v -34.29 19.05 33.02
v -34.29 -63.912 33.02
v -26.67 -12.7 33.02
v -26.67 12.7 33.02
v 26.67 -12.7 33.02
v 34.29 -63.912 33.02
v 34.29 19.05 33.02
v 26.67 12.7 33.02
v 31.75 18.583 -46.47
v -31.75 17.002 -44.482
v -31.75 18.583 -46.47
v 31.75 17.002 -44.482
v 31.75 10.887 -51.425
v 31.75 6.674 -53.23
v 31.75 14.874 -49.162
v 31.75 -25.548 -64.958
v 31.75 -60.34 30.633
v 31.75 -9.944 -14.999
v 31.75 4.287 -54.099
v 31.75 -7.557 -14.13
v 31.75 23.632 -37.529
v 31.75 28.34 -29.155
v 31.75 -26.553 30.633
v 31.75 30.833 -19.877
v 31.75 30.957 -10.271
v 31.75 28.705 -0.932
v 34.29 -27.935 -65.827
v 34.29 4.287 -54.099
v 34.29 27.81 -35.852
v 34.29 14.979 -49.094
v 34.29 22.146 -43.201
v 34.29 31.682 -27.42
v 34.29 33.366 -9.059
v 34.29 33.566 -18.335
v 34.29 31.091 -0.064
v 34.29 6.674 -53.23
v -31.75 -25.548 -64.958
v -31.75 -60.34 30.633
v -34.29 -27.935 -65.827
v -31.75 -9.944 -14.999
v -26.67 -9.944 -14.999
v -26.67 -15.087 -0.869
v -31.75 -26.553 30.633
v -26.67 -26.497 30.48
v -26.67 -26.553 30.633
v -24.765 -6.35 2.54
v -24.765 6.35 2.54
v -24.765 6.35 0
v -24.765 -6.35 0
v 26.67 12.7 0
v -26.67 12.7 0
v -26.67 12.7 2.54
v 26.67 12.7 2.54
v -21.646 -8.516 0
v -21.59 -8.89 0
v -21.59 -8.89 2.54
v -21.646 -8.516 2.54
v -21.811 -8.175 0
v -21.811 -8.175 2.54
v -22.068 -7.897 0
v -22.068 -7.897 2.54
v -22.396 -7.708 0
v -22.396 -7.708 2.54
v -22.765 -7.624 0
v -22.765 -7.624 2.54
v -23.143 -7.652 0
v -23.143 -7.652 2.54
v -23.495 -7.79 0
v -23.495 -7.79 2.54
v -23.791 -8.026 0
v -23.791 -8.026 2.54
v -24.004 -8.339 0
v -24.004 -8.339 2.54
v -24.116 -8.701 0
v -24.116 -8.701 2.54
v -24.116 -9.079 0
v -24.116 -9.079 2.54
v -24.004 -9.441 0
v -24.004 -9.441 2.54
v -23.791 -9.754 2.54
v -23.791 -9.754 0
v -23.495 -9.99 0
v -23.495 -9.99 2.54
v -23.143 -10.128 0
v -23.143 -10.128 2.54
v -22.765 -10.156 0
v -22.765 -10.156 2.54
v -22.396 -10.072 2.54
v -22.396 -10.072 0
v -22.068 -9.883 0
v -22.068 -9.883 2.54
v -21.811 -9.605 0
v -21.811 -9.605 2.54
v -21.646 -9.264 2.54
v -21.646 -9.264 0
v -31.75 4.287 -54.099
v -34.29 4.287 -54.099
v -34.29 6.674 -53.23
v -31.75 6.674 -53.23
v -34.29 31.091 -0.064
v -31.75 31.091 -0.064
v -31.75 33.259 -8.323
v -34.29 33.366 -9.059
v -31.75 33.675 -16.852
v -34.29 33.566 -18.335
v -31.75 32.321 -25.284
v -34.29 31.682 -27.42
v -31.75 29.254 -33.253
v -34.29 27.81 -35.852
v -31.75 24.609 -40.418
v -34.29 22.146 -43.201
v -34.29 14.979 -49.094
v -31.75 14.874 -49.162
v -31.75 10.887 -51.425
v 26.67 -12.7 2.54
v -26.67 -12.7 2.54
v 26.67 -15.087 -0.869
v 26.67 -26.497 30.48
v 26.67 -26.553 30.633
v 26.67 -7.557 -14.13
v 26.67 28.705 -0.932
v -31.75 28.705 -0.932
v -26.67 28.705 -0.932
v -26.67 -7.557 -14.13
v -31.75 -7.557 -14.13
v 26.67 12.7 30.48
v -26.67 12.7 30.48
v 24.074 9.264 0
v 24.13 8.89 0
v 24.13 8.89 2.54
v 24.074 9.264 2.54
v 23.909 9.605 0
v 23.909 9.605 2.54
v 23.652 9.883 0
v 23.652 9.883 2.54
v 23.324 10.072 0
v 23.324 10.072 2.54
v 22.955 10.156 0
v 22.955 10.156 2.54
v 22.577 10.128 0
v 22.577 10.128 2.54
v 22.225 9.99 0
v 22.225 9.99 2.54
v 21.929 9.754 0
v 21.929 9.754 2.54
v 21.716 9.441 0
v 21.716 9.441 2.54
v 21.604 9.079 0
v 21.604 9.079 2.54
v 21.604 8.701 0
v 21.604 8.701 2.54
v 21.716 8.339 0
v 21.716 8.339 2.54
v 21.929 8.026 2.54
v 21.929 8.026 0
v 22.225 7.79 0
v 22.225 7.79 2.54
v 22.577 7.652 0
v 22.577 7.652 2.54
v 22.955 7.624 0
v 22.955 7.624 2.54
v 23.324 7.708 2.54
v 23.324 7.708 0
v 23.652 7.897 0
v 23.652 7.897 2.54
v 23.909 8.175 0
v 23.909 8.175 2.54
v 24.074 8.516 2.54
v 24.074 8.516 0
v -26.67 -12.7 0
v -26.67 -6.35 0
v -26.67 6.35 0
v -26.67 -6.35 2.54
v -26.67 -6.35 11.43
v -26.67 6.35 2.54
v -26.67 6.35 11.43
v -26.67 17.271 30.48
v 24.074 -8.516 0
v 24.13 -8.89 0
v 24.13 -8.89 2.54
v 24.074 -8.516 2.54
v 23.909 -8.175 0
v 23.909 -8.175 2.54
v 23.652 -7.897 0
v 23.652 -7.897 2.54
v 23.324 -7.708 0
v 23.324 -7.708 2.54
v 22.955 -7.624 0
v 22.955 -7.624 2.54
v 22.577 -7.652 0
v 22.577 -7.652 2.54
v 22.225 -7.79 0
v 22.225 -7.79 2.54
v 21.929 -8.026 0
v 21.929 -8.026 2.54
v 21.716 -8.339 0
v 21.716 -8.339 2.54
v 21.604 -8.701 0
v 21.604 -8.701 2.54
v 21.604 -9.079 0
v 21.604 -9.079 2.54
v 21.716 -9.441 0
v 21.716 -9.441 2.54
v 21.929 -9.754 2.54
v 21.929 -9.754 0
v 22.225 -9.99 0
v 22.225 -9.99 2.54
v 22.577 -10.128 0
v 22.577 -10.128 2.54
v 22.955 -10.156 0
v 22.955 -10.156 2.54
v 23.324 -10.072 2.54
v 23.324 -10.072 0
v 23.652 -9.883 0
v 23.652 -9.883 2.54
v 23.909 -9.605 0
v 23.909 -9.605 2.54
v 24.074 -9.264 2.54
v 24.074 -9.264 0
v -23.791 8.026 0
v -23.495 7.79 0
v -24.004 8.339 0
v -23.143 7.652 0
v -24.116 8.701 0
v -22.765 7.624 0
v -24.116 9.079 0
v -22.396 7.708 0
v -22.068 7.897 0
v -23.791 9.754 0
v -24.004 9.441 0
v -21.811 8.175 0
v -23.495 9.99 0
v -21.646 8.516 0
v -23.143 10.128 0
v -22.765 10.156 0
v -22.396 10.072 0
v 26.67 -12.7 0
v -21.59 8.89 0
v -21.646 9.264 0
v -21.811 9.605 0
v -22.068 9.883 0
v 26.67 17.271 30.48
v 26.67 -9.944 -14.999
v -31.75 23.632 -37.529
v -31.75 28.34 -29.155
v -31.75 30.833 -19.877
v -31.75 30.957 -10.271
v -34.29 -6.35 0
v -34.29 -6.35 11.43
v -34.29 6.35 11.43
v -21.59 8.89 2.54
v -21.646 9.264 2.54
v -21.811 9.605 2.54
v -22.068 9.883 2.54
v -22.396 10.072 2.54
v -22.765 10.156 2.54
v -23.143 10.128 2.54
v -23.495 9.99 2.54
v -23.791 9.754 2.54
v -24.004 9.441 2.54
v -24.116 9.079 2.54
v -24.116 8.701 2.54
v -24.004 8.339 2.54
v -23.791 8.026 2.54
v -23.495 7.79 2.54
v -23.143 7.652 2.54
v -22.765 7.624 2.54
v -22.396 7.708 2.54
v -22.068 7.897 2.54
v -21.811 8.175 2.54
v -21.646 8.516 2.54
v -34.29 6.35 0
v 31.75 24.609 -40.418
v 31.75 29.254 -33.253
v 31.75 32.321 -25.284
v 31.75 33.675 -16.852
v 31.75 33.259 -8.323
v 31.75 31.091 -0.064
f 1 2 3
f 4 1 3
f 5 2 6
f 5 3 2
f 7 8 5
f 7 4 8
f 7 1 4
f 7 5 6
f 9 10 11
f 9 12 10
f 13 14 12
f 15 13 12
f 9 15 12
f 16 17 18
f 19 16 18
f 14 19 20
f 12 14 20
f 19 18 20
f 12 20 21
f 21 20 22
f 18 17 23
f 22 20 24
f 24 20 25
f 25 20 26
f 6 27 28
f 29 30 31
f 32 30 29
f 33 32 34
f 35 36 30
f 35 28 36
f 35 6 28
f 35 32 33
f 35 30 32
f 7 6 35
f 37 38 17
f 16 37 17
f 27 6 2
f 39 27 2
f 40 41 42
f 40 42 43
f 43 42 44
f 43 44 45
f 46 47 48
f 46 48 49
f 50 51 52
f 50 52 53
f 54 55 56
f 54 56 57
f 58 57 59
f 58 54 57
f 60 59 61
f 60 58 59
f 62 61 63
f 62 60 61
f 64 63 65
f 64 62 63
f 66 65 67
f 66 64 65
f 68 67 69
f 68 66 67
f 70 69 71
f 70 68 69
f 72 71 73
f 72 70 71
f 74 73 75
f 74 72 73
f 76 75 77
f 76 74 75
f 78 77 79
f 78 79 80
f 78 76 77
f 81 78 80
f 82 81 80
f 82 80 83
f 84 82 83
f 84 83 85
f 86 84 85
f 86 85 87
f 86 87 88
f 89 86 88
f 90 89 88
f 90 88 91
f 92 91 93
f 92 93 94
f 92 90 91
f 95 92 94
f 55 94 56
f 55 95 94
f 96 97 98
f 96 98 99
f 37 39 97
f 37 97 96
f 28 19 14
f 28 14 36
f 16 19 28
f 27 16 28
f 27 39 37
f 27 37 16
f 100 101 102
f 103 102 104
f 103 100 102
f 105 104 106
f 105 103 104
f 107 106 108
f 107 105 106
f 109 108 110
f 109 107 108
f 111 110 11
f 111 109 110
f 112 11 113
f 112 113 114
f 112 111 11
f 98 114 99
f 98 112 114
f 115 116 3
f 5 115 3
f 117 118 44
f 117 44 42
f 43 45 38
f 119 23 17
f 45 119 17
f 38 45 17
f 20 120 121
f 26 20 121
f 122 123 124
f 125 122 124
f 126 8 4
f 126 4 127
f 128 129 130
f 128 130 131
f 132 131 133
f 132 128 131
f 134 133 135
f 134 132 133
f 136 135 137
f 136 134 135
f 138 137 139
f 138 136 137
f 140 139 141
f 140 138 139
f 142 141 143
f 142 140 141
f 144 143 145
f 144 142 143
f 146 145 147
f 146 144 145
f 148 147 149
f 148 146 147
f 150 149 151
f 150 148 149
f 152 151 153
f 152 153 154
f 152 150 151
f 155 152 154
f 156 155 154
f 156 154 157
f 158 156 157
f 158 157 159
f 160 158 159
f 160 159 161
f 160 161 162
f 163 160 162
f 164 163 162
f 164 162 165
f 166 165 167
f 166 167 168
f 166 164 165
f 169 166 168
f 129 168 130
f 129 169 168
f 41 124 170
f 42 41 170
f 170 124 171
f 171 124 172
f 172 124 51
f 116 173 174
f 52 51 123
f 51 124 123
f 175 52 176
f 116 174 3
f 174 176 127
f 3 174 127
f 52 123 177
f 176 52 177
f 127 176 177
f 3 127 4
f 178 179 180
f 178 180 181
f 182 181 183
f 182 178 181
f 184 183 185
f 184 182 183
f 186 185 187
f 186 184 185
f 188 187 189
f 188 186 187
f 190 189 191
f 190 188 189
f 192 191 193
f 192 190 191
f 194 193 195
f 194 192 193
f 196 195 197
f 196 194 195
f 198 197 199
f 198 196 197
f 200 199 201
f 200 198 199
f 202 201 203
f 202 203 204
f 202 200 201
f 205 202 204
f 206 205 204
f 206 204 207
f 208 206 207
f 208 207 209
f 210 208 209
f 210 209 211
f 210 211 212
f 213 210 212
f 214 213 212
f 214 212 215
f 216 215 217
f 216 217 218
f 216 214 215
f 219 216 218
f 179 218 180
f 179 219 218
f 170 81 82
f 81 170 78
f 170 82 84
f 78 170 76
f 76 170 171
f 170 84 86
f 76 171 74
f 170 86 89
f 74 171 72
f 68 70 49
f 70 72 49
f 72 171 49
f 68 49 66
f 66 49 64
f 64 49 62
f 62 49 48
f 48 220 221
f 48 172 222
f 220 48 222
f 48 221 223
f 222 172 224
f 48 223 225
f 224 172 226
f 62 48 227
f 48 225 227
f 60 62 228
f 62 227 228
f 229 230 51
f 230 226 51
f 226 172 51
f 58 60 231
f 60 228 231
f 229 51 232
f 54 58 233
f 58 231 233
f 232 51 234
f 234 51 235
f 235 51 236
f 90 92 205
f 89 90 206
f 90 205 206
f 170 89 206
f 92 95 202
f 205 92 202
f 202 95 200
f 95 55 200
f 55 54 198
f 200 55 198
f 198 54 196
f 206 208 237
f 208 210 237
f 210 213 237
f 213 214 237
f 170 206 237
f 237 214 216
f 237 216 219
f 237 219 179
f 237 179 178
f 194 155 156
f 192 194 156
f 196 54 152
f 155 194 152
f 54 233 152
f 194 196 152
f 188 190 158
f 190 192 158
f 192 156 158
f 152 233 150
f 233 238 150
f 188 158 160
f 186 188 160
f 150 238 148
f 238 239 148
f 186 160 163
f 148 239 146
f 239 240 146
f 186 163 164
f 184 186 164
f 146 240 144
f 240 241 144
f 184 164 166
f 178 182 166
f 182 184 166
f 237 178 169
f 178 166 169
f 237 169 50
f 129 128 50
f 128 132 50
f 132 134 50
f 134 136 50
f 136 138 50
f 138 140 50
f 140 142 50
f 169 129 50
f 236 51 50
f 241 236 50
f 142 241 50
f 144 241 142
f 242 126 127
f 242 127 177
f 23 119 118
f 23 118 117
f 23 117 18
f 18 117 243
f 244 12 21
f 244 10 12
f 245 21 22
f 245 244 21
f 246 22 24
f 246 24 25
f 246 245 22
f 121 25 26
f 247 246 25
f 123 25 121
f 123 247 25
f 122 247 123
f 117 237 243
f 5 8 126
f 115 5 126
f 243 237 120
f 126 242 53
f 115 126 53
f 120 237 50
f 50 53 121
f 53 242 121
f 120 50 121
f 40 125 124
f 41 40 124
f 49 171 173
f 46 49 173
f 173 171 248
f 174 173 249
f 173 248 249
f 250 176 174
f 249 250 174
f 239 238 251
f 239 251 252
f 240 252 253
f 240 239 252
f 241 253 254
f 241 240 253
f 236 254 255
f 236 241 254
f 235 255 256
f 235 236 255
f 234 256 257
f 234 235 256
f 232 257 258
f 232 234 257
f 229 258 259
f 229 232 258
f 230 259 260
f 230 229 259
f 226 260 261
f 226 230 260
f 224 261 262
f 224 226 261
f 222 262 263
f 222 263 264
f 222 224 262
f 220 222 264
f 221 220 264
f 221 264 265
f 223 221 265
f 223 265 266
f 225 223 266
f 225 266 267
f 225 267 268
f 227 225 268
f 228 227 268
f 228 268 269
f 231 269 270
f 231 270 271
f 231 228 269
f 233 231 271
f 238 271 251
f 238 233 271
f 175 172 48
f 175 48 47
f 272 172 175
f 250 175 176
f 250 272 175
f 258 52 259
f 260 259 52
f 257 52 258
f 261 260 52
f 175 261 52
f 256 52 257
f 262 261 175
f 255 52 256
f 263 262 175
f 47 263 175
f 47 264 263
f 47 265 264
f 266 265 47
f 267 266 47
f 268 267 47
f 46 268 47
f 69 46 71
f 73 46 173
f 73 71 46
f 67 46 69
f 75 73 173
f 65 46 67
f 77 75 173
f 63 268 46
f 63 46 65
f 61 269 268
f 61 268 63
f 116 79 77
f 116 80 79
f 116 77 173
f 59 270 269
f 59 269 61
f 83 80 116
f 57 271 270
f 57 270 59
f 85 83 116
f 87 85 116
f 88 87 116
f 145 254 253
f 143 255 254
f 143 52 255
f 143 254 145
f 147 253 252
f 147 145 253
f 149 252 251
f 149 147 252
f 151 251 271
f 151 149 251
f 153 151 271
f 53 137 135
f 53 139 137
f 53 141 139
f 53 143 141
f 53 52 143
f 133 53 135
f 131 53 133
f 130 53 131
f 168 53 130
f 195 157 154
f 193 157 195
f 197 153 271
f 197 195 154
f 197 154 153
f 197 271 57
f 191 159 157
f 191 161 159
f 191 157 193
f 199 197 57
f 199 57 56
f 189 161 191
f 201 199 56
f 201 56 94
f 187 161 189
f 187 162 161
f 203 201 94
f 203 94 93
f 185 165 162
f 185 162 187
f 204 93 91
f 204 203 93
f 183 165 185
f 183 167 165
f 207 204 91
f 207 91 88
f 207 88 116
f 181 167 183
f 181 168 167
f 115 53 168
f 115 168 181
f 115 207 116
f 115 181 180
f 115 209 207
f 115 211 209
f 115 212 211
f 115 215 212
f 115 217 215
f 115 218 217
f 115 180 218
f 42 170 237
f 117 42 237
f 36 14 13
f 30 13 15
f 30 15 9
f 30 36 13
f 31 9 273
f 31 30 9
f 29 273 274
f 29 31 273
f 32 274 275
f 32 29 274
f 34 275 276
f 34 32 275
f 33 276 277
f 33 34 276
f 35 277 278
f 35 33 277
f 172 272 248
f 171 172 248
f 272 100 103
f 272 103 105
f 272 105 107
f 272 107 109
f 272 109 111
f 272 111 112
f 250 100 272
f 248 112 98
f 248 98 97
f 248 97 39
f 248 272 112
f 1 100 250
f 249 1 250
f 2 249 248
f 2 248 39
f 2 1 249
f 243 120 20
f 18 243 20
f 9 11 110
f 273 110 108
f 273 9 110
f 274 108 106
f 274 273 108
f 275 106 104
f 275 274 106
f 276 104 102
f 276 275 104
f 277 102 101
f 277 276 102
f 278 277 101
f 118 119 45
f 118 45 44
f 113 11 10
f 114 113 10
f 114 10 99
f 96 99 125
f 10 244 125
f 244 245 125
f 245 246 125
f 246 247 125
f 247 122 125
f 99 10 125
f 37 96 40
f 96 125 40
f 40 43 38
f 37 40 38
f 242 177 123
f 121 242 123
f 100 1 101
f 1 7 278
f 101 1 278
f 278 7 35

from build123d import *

# Parameters (mm, degrees)
F0_W      = 53.34
F0_H      = 25.4
F0_R      = 1.27
F1_DEPTH  = 2.54
F3_DEPTH  = 53.34
F5_DEPTH  = 7.62
F6_W      = 12.7
F6_H      = 8.89
F7_DEPTH  = 7.62
F8_W      = 12.7
F8_H      = 2.54
F9_DEPTH  = 9.525
F10_W     = 68.58
F10_H     = 41.6090539173
F11_DEPTH = 2.54
F13_REACH = 169.3857709485
F15_DEPTH = 63.5
F17_DEPTH = 2.54
F19_DEPTH = 2.54
F21_DEPTH = 2.54
F22_W     = 63.5
F22_H     = 2.54


with BuildPart() as f1:
    # F0 (on Top) → F1 (new body)
    with BuildSketch(Plane.XY):
        Rectangle(F0_W, F0_H)
        with Locations((-22.86, -8.89)):
            Circle(F0_R, mode=Mode.SUBTRACT)
        with Locations((22.86, -8.89)):
            Circle(F0_R, mode=Mode.SUBTRACT)
        with Locations((-22.86, 8.89)):
            Circle(F0_R, mode=Mode.SUBTRACT)
        with Locations((22.86, 8.89)):
            Circle(F0_R, mode=Mode.SUBTRACT)
    extrude(amount=F1_DEPTH)

    # F2 (on face) → F3 (join, through all)
    with BuildSketch(Plane.YZ.offset(26.67)):
        Polygon((-15.24, -0.447870531), (-9.9437557743, -14.9991819491), (-7.5569365175, -14.130450785), (-12.7, 0), (-12.7, 2.54), (-12.7, 33.02), (-27.4213086776, 33.02), (-26.4968242825, 30.48), (-15.24, 30.48), align=None)
        Polygon((-26.4968242825, 30.48), (-15.24, -0.447870531), (-15.24, 30.48), align=None)
    extrude(amount=-F3_DEPTH)



with BuildPart() as f3:
    # F2 (on face) → F3, piece 2 (new body, through all)
    with BuildSketch(Plane.YZ.offset(26.67)):
        Polygon((12.7, 33.02), (12.7, 30.48), (17.2714728529, 30.48), (28.7046231961, -0.9323224012), (31.0914424529, -0.0635912371), (19.05, 33.02), align=None)
    extrude(amount=-F3_DEPTH)


with BuildPart() as f1_1:
    add(f1.part)

    add(f3.part)  # F5 merges F3
    # F4 (on face) → F5 (join)
    with BuildSketch(Plane.YZ.offset(26.67)):
        Polygon((-27.4213086776, 33.02), (-9.9437557743, -14.9991819491), (31.0914424529, -0.0635912371), (19.05, 33.02), align=None)
    extrude(amount=F5_DEPTH)

    # F6 (on face) → F7 (join)
    with BuildSketch(Plane(origin=(-26.67, 0, 0), x_dir=(0, -1, 0), z_dir=(-1, 0, 0))):
        Polygon((9.9437557743, -14.9991819491), (27.4213086776, 33.02), (-19.05, 33.02), (-31.0914424529, -0.0635912371), align=None)
        with Locations((0, 6.985)):
            Rectangle(F6_W, F6_H, mode=Mode.SUBTRACT)
    extrude(amount=F7_DEPTH)

    # F8 (on face) → F9 (cut)
    with BuildSketch(Plane(origin=(-34.29, 0, 0), x_dir=(0, -1, 0), z_dir=(-1, 0, 0))):
        with Locations((0, 1.27)):
            Rectangle(F8_W, F8_H)
    extrude(amount=-F9_DEPTH, mode=Mode.SUBTRACT)

    # F10 (on face) → F11 (join, through all)
    with BuildSketch(Plane(origin=(0, -13.6012014706, -4.9504324856), x_dir=(1, 0, 0), z_dir=(0, -0.9396926208, -0.3420201433))):
        with Locations((0, -31.4981827789)):
            Rectangle(F10_W, F10_H)
    extrude(amount=-F11_DEPTH)

    f13_end = Plane(origin=(0, -7.2808291762, 33.02), x_dir=(1, 0, 0), z_dir=(0, 0, 1))
    # F12 (on face) → F13 (join, up to a plane its end follows)
    with BuildSketch(Plane(origin=(0, 17.8885802808, -49.1484703875), x_dir=(1, 0, 0), z_dir=(0, 0.3420201433, -0.9396926208))):
        Polygon((31.75, 14.474096284), (34.29, 14.474096284), (34.29, 48.764096284), (-34.29, 48.764096284), (-34.29, 14.474096284), (-31.75, 14.474096284), (-31.75, 46.224096284), (31.75, 46.224096284), align=None)
    f13_long = extrude(amount=-F13_REACH, mode=Mode.PRIVATE)
    add(split(f13_long, bisect_by=f13_end, keep=Keep.BOTTOM, mode=Mode.PRIVATE))

    # F14 (on face) → F15 (join, through all)
    with BuildSketch(Plane(origin=(31.75, 0, 0), x_dir=(0, -1, 0), z_dir=(-1, 0, 0))):
        Polygon((27.4213086775, 33.02), (26.5525775135, 30.6331807432), (60.3402217897, 30.6331807432), (61.2089529537, 33.02), align=None)
    extrude(amount=F15_DEPTH)

    # F16 (on face) → F17 (cut, through all)
    with BuildSketch(Plane(origin=(0, -11.2143822138, -4.0817013215), x_dir=(-1, 0, 0), z_dir=(0, 0.9396926208, 0.3420201433))):
        Polygon((26.67, 4.3436558202), (-26.67, 4.3436558202), (-26.67, -10.6936558203), (-31.75, -10.6936558203), (-31.75, -52.3027097376), (31.75, -52.3027097376), (31.75, -10.6936558203), (26.67, -10.6936558203), align=None)
    extrude(amount=-F17_DEPTH, mode=Mode.SUBTRACT)

    # F18 (on face) → F19 (join)
    with BuildSketch(Plane.YZ.offset(34.29)):
        with BuildLine():
            ThreePointArc((6.6741980668, -53.230171709), (29.9844867323, -31.7454245982), (31.0914424529, -0.0635912371))
            Line((31.0914424529, -0.0635912371), (-7.5569365175, -14.130450785))
            Line((-7.5569365176, -14.130450785), (6.6741980668, -53.230171709))
        make_face()
    extrude(amount=-F19_DEPTH)

    # F20 (on face) → F21 (join)
    with BuildSketch(Plane(origin=(-34.29, 0, 0), x_dir=(0, -1, 0), z_dir=(-1, 0, 0))):
        with BuildLine():
            ThreePointArc((-31.0914424529, -0.0635912371), (-29.9844867323, -31.7454245982), (-6.6741980668, -53.230171709))
            Line((-6.6741980669, -53.230171709), (7.5569365175, -14.130450785))
            Line((7.5569365175, -14.130450785), (-31.0914424529, -0.0635912371))
        make_face()
    extrude(amount=-F21_DEPTH)

    # F24: sweep along a path in F23
    with BuildLine(Plane(origin=(31.75, 0, 0), x_dir=(0, -1, 0), z_dir=(-1, 0, 0))) as f24_path:
        ThreePointArc((-18.5834505022, -46.4695330224), (-32.3206049052, -25.2835298235), (-31.0914424529, -0.0635912371))
    # F22 (on face) → F24 (sweep)
    with BuildSketch(Plane(origin=(0, 3.6574456963, -10.0487494635), x_dir=(1, 0, 0), z_dir=(0, 0.3420201433, -0.9396926208))):
        with Locations((0, -27.9246495586)):
            Rectangle(F22_W, F22_H)
    sweep(path=f24_path.line)


solid = f1_1.part
